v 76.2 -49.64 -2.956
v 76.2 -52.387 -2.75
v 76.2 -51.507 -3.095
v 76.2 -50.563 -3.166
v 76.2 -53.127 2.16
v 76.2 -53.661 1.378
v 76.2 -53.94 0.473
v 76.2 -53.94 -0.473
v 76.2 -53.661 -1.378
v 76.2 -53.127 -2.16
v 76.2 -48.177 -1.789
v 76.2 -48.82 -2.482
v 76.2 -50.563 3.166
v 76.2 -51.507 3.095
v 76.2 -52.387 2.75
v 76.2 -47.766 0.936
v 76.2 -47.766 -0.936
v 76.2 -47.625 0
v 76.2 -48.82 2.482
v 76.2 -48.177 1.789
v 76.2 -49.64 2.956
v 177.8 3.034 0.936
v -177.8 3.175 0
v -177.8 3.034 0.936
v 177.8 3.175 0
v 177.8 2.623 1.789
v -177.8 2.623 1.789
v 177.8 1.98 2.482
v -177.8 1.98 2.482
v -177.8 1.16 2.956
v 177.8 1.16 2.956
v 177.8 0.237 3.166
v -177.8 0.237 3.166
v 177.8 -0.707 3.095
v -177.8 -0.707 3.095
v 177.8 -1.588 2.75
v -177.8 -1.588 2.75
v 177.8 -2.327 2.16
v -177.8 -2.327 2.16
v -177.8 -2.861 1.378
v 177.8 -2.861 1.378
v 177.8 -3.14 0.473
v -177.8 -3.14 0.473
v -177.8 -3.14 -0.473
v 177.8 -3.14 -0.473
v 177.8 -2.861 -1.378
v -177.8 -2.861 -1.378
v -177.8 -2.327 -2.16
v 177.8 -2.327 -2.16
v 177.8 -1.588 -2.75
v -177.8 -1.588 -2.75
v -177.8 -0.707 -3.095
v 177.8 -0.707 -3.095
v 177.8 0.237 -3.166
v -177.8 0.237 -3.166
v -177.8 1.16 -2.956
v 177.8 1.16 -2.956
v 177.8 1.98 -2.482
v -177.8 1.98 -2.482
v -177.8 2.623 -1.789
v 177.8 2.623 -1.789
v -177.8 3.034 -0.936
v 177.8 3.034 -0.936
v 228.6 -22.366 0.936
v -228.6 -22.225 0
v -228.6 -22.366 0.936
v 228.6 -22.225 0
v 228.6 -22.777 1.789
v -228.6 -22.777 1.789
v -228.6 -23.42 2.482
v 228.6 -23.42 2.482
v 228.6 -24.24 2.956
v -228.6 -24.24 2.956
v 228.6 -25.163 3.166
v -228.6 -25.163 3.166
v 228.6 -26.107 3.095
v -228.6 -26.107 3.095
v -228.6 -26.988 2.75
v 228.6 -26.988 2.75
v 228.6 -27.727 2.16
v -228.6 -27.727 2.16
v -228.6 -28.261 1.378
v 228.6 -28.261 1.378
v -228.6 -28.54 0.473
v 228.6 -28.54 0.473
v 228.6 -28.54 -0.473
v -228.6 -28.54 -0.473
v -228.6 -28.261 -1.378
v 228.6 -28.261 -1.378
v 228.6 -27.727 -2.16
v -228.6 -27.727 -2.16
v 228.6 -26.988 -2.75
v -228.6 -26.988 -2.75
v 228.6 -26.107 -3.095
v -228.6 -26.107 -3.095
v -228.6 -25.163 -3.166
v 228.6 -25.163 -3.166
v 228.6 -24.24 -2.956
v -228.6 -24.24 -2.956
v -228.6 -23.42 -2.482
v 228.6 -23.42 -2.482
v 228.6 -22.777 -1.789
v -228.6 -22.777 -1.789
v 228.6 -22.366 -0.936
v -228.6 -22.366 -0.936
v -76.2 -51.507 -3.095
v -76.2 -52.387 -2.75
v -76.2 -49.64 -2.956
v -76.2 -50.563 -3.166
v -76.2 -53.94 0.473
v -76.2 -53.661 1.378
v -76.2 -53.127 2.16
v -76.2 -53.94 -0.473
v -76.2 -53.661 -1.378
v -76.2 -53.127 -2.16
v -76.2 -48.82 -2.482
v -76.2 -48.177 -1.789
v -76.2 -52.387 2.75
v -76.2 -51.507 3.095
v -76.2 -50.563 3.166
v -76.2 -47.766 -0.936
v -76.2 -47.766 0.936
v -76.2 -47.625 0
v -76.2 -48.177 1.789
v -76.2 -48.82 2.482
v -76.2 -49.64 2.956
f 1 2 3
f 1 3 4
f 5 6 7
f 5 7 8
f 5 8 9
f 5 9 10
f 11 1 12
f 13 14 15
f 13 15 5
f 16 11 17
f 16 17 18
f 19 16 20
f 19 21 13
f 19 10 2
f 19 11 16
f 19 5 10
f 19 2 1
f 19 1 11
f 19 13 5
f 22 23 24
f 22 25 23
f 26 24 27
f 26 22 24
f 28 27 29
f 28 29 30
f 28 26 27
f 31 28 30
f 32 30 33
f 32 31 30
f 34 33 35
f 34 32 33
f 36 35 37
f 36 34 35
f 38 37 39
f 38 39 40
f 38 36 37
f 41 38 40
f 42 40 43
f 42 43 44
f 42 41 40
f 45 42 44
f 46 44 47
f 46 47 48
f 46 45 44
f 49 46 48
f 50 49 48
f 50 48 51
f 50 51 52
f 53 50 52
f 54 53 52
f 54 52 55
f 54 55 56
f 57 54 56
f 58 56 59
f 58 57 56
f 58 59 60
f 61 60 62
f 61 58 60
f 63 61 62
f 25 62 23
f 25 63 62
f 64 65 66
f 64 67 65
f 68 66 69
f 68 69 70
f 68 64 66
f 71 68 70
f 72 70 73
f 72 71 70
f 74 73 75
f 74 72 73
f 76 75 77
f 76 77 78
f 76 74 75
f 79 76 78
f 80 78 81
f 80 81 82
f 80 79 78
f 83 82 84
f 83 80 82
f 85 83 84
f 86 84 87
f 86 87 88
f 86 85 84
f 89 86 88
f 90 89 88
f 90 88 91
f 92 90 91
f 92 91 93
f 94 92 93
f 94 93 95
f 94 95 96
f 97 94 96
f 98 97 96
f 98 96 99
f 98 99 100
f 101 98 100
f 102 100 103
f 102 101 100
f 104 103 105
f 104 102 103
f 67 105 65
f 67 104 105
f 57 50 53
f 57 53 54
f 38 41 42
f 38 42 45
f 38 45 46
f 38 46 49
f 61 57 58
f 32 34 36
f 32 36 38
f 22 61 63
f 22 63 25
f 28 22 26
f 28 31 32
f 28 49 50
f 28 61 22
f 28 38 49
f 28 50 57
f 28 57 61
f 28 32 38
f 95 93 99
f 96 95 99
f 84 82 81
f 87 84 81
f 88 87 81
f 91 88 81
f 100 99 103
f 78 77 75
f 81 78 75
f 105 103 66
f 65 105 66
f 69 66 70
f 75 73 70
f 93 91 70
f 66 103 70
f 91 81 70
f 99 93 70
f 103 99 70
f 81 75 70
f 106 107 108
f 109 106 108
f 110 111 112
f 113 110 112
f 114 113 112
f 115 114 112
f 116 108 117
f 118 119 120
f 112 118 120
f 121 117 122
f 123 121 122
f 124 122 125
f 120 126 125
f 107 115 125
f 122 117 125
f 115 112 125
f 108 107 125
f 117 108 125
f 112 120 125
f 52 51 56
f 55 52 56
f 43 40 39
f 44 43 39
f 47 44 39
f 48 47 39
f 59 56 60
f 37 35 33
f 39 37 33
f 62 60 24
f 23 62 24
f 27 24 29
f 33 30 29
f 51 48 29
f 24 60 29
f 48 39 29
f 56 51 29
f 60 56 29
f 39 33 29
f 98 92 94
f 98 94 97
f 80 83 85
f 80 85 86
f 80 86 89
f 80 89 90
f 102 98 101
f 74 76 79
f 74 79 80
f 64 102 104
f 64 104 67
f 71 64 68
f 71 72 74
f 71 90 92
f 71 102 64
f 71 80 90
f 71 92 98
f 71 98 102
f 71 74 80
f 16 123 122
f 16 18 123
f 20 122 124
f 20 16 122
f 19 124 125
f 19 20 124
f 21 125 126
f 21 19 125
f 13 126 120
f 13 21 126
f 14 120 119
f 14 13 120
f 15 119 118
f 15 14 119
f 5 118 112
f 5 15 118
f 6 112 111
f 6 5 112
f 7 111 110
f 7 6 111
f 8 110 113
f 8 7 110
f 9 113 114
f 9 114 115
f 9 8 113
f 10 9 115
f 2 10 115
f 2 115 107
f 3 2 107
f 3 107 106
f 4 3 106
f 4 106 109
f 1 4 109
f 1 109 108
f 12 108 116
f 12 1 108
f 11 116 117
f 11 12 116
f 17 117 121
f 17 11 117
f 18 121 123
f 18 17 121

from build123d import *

# Parameters (mm, degrees)
F0_R     = 3.175
F1_DEPTH = 177.8
F2_R     = 3.175
F3_DEPTH = 228.6
F4_R     = 3.175
F5_DEPTH = 76.2


with BuildPart() as f1:
    # F0 (on Right) → F1 (new body, symmetric)
    with BuildSketch(Plane.YZ):
        Circle(F0_R)
    extrude(amount=F1_DEPTH, both=True)


with BuildPart() as f3:
    # F2 (on Right) → F3 (new body, symmetric)
    with BuildSketch(Plane.YZ):
        with Locations((-25.4, 0)):
            Circle(F2_R)
    extrude(amount=F3_DEPTH, both=True)


with BuildPart() as f5:
    # F4 (on Right) → F5 (new body, symmetric)
    with BuildSketch(Plane.YZ):
        with Locations((-50.8, 0)):
            Circle(F4_R)
    extrude(amount=F5_DEPTH, both=True)


solid = Compound([f1.part, f3.part, f5.part])
